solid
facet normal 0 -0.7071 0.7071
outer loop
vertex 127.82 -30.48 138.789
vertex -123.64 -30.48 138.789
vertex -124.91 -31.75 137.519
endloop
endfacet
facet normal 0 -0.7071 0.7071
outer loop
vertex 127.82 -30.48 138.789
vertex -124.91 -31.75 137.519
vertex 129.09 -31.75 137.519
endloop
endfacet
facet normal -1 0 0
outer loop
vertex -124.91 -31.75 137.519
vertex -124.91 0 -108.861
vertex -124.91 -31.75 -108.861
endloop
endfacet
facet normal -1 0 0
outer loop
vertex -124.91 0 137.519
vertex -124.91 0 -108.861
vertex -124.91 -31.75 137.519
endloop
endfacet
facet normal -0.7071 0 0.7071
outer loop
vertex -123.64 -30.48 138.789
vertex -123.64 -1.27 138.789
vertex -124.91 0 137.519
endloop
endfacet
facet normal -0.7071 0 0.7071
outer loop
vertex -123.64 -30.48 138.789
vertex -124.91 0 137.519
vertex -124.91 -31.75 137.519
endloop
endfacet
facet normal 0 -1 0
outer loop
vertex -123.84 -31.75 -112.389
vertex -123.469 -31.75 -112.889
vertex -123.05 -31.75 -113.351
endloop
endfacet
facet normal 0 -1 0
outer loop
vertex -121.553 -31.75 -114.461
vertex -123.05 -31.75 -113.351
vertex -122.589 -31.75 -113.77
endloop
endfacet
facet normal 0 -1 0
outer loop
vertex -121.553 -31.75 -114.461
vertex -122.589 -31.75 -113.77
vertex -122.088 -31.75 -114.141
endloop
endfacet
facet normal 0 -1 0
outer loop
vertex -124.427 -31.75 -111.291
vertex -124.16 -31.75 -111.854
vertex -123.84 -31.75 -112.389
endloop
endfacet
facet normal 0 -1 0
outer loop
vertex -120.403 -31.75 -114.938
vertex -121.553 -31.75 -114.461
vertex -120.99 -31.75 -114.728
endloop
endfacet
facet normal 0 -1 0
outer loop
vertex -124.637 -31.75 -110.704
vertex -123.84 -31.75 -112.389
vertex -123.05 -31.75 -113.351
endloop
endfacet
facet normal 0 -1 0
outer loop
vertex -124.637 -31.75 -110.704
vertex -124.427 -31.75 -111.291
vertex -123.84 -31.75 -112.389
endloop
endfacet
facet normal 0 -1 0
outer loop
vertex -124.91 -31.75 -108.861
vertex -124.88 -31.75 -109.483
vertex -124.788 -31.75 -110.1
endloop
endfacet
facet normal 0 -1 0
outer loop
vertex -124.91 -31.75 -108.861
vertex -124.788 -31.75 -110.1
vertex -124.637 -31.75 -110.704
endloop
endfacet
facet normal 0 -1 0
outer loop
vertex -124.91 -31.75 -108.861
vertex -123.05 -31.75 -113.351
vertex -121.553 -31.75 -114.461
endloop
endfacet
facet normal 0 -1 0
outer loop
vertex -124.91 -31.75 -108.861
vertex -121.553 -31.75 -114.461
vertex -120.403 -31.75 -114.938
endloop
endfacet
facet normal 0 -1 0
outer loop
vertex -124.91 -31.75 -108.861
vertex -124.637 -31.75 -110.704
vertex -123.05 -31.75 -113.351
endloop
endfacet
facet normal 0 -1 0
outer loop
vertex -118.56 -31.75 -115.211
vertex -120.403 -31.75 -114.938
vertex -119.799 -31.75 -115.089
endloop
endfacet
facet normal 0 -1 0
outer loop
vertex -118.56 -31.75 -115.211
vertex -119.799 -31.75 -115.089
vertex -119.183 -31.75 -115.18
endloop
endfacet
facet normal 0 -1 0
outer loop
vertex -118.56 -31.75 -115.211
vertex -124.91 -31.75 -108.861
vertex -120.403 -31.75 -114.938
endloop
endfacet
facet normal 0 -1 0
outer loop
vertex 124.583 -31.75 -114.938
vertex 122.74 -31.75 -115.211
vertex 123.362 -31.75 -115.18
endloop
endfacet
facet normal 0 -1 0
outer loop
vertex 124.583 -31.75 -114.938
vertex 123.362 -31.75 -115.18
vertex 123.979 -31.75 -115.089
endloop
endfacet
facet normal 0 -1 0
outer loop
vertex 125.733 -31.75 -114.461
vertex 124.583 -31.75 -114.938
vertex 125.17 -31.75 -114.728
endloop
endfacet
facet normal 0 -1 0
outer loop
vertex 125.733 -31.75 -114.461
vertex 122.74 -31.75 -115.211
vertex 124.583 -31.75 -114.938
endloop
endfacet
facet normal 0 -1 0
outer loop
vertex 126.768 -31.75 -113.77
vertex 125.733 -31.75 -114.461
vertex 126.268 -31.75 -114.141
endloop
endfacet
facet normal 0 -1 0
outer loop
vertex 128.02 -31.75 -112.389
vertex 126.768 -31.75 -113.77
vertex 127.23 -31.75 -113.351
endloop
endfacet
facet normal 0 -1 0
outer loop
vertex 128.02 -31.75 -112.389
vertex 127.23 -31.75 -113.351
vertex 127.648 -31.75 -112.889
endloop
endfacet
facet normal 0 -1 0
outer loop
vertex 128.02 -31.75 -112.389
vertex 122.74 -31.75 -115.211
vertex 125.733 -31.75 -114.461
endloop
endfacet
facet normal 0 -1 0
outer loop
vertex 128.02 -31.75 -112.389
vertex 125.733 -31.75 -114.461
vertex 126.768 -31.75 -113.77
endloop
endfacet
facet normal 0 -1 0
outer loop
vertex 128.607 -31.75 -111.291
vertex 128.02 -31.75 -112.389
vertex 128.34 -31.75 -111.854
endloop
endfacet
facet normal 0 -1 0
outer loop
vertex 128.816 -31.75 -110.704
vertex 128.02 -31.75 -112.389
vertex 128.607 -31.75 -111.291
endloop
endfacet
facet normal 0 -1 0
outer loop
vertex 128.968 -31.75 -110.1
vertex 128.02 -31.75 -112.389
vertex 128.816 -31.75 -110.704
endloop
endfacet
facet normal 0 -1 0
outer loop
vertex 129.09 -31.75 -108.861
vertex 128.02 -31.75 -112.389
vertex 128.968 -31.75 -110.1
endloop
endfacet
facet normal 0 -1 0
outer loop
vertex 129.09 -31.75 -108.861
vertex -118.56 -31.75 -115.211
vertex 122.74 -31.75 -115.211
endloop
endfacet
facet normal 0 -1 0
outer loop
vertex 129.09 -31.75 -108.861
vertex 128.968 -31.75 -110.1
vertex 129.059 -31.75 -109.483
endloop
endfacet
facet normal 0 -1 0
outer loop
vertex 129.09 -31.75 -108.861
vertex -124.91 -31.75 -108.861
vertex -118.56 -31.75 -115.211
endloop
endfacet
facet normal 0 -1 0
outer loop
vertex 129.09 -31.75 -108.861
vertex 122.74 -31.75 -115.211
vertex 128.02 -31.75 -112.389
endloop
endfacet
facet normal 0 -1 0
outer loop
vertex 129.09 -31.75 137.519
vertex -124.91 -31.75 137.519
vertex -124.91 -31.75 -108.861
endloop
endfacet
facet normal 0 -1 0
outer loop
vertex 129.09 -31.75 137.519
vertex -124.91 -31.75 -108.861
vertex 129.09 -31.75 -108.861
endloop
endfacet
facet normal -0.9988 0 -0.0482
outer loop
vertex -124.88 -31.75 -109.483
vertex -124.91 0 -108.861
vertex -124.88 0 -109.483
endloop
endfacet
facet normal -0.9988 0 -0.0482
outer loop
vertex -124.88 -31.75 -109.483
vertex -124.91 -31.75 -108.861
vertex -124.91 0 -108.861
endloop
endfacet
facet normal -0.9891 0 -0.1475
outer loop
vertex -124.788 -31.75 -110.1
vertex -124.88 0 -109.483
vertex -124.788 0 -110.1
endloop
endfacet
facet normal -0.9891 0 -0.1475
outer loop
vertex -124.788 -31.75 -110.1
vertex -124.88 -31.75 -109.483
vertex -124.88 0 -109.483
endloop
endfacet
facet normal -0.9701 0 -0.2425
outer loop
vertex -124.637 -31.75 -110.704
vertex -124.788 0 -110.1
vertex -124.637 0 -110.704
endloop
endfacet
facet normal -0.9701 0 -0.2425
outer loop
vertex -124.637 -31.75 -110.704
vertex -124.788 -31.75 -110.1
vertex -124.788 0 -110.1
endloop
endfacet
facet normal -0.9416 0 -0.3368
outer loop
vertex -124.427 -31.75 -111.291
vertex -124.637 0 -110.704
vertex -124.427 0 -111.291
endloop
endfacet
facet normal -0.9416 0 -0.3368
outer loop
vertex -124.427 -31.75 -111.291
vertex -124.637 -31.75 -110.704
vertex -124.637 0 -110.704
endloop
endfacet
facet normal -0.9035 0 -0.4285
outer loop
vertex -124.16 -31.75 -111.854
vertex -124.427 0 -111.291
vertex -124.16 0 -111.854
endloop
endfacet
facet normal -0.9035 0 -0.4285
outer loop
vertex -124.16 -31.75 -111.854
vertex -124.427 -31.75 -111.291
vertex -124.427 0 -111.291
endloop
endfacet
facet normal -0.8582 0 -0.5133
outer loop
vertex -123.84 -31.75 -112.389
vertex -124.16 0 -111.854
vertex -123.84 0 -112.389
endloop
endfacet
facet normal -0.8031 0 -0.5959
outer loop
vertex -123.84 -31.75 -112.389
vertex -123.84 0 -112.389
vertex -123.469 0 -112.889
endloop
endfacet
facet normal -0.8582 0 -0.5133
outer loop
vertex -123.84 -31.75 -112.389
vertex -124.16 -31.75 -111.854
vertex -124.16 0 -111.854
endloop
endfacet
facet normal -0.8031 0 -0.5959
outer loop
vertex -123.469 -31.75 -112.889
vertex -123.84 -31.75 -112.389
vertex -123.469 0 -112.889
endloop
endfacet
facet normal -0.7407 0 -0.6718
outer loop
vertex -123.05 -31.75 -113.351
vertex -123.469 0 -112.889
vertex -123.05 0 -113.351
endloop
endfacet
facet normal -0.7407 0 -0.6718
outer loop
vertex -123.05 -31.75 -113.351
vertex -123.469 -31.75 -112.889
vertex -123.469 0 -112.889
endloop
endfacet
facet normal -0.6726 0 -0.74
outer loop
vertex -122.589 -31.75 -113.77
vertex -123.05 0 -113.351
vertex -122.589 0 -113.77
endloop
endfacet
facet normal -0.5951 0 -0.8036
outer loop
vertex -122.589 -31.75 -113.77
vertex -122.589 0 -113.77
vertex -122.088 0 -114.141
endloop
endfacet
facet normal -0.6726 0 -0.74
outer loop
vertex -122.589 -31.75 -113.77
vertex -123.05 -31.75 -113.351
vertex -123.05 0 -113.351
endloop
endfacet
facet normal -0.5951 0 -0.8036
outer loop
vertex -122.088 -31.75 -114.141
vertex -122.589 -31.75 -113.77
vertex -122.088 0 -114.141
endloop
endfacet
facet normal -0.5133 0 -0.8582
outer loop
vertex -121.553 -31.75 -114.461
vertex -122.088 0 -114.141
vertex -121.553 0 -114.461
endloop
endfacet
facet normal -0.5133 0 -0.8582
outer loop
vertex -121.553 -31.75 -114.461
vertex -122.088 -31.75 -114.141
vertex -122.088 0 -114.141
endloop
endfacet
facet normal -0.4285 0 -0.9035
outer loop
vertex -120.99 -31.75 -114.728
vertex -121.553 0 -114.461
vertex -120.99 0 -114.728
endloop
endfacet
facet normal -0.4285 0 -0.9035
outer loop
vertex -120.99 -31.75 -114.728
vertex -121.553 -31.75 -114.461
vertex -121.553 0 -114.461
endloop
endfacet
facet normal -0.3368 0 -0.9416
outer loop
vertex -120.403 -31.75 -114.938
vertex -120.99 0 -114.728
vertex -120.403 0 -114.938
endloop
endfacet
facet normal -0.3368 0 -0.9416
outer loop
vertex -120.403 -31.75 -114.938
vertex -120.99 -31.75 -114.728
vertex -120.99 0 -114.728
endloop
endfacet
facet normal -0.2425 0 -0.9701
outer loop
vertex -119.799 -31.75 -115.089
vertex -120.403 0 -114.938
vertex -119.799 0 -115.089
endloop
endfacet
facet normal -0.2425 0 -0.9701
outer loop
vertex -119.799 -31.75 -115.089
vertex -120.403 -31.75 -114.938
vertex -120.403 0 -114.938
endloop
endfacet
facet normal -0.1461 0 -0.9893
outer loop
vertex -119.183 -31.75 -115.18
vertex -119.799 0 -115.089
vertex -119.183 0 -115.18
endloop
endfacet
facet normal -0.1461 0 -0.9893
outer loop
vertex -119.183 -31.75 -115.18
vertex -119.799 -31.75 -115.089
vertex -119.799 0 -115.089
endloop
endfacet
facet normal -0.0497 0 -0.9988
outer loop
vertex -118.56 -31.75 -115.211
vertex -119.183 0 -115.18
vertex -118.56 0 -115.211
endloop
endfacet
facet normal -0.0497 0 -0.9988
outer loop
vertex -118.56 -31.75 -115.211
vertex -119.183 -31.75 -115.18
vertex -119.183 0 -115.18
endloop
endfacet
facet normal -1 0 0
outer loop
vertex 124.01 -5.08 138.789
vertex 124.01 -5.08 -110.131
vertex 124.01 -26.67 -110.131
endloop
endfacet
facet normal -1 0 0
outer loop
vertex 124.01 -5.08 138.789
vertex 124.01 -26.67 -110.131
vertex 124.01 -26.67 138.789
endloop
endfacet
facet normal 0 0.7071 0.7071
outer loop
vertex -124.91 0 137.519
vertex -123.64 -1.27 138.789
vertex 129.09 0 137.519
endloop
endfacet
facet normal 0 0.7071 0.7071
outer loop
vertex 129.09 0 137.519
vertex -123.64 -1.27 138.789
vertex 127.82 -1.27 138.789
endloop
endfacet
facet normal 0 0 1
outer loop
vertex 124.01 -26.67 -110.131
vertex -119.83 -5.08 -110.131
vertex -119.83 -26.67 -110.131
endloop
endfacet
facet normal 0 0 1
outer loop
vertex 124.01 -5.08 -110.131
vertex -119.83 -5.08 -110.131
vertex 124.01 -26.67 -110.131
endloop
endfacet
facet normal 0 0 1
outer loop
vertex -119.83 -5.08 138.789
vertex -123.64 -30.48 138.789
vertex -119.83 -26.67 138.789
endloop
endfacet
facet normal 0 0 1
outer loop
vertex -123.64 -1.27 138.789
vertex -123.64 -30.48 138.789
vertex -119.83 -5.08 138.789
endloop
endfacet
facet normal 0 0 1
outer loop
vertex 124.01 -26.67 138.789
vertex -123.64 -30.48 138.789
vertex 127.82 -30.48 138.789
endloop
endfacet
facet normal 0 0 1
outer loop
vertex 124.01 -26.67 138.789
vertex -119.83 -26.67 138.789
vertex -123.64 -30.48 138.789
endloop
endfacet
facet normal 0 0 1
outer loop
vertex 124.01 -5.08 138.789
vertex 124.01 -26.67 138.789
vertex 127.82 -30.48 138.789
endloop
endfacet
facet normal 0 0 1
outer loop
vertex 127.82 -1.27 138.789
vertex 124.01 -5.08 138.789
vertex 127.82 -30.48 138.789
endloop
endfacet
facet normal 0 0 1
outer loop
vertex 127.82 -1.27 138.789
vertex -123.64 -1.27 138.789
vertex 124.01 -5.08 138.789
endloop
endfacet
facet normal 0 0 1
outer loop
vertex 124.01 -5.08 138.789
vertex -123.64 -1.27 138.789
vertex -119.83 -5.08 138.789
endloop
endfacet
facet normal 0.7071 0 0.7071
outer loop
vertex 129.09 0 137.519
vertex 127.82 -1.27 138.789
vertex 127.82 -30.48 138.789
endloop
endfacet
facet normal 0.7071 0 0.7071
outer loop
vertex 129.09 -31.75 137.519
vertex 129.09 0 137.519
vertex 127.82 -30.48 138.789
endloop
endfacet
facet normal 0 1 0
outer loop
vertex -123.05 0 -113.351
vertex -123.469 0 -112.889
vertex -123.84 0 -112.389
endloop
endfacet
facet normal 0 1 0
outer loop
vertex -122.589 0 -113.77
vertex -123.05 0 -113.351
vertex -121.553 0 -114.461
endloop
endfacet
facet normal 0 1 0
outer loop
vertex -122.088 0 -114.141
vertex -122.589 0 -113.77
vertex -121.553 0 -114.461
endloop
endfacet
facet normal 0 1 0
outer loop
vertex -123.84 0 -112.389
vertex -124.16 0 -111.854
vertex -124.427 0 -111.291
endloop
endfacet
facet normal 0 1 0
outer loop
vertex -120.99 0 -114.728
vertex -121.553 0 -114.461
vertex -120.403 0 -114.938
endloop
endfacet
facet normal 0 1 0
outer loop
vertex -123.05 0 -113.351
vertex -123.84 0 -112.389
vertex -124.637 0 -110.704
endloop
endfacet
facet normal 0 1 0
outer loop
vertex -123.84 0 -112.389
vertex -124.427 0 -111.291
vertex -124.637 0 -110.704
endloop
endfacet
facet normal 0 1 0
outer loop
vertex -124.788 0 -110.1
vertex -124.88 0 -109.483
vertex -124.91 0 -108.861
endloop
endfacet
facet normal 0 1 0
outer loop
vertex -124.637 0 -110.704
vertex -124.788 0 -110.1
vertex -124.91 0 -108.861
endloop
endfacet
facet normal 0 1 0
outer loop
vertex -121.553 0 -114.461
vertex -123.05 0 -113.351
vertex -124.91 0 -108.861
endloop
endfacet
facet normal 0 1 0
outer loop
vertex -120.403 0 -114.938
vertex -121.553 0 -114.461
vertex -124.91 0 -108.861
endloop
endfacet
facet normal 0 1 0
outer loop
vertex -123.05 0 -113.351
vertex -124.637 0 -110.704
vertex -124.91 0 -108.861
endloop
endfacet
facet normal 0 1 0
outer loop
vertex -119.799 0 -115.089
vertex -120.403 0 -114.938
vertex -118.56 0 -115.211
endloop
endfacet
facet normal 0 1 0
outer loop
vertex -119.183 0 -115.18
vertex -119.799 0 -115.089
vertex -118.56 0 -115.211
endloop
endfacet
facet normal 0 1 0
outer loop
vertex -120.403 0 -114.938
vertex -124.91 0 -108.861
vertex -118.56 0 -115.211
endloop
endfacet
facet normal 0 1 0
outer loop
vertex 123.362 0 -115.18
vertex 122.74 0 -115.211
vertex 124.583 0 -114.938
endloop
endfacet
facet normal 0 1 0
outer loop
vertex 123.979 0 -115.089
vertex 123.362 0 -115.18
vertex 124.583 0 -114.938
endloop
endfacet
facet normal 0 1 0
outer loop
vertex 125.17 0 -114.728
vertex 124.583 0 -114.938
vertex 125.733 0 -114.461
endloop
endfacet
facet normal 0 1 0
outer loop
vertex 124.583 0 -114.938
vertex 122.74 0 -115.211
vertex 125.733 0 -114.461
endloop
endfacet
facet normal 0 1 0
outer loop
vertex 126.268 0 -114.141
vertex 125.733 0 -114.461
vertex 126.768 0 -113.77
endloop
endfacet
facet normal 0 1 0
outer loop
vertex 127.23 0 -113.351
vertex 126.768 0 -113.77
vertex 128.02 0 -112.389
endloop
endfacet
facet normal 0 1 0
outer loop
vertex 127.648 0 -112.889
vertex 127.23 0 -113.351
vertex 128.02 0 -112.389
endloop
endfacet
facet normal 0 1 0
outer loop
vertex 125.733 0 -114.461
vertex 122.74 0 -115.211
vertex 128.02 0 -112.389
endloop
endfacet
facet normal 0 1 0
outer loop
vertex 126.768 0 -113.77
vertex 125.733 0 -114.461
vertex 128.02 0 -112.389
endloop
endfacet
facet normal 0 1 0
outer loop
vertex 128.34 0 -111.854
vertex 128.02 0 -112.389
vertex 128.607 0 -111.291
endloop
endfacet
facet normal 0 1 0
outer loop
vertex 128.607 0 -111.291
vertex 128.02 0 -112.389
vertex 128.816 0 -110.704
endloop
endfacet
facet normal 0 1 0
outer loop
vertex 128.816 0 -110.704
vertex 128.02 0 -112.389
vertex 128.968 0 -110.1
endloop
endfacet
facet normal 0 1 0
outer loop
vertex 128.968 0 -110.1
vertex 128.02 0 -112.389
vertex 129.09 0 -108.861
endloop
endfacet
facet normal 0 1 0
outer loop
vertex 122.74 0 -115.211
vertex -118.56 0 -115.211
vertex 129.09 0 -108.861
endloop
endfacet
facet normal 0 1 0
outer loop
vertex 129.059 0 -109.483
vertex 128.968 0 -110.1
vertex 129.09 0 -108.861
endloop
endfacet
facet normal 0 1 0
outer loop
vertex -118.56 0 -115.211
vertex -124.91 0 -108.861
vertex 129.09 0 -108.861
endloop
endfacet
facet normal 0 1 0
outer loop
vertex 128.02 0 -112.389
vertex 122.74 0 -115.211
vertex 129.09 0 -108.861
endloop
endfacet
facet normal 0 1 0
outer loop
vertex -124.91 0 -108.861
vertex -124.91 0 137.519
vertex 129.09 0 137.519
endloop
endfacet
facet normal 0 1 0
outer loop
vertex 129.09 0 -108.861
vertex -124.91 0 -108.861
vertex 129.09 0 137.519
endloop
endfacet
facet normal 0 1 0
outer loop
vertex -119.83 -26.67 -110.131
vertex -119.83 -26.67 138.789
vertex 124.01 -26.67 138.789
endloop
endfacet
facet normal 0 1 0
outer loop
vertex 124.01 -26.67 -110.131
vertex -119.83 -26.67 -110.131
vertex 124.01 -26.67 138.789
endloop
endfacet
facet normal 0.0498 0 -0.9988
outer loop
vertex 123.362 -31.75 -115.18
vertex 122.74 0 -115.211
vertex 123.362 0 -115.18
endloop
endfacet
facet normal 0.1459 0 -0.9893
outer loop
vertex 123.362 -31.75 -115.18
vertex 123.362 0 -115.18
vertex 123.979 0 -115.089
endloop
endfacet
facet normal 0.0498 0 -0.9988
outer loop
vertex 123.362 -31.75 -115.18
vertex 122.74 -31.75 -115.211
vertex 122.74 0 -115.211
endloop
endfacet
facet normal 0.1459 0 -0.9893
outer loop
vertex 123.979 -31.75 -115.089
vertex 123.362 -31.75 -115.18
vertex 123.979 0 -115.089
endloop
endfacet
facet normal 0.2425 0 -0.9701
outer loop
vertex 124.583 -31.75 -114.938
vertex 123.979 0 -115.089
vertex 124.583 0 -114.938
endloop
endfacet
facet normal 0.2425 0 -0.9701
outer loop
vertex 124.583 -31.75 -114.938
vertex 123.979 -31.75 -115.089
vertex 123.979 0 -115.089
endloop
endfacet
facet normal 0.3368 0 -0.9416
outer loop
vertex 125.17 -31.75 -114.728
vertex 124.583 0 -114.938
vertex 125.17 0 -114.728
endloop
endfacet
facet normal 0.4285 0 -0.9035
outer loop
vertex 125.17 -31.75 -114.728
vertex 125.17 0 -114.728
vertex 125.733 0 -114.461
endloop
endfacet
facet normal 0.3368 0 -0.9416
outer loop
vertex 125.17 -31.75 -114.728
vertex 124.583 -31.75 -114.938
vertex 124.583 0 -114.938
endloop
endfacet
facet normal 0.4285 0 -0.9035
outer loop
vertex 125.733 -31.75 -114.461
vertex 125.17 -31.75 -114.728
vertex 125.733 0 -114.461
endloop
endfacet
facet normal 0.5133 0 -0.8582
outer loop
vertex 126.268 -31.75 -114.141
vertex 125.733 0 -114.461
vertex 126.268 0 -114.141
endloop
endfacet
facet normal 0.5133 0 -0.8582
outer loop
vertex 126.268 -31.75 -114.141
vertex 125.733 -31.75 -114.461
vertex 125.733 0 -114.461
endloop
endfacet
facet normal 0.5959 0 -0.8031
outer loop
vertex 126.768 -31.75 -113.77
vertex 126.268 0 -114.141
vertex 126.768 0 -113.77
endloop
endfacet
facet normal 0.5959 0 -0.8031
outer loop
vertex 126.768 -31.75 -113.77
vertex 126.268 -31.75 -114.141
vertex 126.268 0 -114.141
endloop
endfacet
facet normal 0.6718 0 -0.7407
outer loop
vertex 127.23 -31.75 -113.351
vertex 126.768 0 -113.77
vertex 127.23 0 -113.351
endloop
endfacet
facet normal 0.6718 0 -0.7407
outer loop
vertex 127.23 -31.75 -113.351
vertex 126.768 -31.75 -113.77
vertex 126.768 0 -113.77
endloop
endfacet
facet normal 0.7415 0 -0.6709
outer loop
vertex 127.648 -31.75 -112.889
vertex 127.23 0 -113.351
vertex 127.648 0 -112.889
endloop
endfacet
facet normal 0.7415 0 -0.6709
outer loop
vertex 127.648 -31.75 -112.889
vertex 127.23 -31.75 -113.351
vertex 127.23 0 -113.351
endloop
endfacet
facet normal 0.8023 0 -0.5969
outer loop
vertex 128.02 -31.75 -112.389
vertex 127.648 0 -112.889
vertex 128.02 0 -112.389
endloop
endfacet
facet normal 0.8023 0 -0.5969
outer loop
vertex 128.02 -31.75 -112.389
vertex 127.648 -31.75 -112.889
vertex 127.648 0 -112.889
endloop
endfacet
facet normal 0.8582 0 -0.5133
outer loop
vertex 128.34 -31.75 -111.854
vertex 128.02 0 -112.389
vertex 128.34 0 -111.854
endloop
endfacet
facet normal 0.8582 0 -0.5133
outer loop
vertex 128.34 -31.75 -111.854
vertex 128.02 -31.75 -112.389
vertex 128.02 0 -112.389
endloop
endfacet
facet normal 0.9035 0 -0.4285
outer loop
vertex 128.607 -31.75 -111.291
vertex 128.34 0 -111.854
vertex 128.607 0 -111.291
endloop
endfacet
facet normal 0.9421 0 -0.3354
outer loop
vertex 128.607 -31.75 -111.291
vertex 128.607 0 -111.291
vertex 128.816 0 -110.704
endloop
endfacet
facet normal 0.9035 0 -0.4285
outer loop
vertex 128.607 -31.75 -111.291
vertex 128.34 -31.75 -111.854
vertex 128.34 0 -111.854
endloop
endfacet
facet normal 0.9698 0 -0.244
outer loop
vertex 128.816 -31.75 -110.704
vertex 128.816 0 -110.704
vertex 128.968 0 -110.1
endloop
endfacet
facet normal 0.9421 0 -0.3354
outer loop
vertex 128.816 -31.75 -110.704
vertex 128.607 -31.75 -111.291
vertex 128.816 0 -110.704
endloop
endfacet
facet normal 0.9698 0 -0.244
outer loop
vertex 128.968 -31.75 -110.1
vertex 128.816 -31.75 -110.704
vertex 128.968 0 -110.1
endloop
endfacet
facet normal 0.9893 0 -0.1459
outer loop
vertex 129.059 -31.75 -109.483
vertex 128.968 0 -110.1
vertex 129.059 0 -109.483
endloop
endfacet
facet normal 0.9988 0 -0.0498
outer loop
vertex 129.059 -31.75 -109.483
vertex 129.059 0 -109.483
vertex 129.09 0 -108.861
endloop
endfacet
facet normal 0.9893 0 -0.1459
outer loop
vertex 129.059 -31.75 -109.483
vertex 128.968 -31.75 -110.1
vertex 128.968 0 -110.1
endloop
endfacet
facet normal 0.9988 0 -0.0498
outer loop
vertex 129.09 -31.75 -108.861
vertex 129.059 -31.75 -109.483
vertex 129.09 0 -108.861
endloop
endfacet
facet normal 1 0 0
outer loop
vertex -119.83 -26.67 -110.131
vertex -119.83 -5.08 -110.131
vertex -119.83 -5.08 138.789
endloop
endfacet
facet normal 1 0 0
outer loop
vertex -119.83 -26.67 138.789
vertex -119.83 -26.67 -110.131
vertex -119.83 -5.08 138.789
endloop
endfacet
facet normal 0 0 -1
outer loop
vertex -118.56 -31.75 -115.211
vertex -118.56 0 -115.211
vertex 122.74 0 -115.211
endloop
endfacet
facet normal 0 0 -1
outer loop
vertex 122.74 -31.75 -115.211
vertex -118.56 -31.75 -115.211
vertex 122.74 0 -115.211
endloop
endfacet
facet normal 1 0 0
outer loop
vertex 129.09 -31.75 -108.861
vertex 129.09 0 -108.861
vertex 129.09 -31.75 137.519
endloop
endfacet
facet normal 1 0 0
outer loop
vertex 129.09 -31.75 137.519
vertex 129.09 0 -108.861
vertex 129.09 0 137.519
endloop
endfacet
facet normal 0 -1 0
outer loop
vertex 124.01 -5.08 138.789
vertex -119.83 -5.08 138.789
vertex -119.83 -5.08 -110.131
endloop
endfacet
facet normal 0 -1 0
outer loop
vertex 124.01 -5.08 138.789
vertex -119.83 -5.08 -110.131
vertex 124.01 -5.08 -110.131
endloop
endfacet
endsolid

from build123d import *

# Parameters (mm, degrees)
F0_W     = 254
F0_H     = 254
F1_DEPTH = 31.75
F2_T     = -5.08
F3_SIZE  = 1.27
F4_R     = 6.35


with BuildPart() as f1:
    # F0 (on Front) → F1 (new body)
    with BuildSketch(Plane.XZ):
        with Locations((2.089877, 11.789044)):
            Rectangle(F0_W, F0_H)
    extrude(amount=F1_DEPTH)

    # F2
    f2_openings = [f1.faces().sort_by_distance(p)[0] for p in [
        (2.089877, -15.875, 138.789044),
    ]]
    offset(amount=F2_T, openings=f2_openings)

    # F3
    f3_edges = [f1.edges().sort_by_distance(p)[0] for p in [
        (2.089877, -31.75, 138.789044),
        (-124.910123, -15.875, 138.789044),
        (2.089877, 0, 138.789044),
        (129.089877, -15.875, 138.789044),
    ]]
    chamfer(f3_edges, length=F3_SIZE)

    # F4
    f4_edges = [f1.edges().sort_by_distance(p)[0] for p in [
        (129.089877, -15.875, -115.210956),
        (-124.910123, -15.875, -115.210956),
    ]]
    fillet(f4_edges, radius=F4_R)


solid = f1.part
